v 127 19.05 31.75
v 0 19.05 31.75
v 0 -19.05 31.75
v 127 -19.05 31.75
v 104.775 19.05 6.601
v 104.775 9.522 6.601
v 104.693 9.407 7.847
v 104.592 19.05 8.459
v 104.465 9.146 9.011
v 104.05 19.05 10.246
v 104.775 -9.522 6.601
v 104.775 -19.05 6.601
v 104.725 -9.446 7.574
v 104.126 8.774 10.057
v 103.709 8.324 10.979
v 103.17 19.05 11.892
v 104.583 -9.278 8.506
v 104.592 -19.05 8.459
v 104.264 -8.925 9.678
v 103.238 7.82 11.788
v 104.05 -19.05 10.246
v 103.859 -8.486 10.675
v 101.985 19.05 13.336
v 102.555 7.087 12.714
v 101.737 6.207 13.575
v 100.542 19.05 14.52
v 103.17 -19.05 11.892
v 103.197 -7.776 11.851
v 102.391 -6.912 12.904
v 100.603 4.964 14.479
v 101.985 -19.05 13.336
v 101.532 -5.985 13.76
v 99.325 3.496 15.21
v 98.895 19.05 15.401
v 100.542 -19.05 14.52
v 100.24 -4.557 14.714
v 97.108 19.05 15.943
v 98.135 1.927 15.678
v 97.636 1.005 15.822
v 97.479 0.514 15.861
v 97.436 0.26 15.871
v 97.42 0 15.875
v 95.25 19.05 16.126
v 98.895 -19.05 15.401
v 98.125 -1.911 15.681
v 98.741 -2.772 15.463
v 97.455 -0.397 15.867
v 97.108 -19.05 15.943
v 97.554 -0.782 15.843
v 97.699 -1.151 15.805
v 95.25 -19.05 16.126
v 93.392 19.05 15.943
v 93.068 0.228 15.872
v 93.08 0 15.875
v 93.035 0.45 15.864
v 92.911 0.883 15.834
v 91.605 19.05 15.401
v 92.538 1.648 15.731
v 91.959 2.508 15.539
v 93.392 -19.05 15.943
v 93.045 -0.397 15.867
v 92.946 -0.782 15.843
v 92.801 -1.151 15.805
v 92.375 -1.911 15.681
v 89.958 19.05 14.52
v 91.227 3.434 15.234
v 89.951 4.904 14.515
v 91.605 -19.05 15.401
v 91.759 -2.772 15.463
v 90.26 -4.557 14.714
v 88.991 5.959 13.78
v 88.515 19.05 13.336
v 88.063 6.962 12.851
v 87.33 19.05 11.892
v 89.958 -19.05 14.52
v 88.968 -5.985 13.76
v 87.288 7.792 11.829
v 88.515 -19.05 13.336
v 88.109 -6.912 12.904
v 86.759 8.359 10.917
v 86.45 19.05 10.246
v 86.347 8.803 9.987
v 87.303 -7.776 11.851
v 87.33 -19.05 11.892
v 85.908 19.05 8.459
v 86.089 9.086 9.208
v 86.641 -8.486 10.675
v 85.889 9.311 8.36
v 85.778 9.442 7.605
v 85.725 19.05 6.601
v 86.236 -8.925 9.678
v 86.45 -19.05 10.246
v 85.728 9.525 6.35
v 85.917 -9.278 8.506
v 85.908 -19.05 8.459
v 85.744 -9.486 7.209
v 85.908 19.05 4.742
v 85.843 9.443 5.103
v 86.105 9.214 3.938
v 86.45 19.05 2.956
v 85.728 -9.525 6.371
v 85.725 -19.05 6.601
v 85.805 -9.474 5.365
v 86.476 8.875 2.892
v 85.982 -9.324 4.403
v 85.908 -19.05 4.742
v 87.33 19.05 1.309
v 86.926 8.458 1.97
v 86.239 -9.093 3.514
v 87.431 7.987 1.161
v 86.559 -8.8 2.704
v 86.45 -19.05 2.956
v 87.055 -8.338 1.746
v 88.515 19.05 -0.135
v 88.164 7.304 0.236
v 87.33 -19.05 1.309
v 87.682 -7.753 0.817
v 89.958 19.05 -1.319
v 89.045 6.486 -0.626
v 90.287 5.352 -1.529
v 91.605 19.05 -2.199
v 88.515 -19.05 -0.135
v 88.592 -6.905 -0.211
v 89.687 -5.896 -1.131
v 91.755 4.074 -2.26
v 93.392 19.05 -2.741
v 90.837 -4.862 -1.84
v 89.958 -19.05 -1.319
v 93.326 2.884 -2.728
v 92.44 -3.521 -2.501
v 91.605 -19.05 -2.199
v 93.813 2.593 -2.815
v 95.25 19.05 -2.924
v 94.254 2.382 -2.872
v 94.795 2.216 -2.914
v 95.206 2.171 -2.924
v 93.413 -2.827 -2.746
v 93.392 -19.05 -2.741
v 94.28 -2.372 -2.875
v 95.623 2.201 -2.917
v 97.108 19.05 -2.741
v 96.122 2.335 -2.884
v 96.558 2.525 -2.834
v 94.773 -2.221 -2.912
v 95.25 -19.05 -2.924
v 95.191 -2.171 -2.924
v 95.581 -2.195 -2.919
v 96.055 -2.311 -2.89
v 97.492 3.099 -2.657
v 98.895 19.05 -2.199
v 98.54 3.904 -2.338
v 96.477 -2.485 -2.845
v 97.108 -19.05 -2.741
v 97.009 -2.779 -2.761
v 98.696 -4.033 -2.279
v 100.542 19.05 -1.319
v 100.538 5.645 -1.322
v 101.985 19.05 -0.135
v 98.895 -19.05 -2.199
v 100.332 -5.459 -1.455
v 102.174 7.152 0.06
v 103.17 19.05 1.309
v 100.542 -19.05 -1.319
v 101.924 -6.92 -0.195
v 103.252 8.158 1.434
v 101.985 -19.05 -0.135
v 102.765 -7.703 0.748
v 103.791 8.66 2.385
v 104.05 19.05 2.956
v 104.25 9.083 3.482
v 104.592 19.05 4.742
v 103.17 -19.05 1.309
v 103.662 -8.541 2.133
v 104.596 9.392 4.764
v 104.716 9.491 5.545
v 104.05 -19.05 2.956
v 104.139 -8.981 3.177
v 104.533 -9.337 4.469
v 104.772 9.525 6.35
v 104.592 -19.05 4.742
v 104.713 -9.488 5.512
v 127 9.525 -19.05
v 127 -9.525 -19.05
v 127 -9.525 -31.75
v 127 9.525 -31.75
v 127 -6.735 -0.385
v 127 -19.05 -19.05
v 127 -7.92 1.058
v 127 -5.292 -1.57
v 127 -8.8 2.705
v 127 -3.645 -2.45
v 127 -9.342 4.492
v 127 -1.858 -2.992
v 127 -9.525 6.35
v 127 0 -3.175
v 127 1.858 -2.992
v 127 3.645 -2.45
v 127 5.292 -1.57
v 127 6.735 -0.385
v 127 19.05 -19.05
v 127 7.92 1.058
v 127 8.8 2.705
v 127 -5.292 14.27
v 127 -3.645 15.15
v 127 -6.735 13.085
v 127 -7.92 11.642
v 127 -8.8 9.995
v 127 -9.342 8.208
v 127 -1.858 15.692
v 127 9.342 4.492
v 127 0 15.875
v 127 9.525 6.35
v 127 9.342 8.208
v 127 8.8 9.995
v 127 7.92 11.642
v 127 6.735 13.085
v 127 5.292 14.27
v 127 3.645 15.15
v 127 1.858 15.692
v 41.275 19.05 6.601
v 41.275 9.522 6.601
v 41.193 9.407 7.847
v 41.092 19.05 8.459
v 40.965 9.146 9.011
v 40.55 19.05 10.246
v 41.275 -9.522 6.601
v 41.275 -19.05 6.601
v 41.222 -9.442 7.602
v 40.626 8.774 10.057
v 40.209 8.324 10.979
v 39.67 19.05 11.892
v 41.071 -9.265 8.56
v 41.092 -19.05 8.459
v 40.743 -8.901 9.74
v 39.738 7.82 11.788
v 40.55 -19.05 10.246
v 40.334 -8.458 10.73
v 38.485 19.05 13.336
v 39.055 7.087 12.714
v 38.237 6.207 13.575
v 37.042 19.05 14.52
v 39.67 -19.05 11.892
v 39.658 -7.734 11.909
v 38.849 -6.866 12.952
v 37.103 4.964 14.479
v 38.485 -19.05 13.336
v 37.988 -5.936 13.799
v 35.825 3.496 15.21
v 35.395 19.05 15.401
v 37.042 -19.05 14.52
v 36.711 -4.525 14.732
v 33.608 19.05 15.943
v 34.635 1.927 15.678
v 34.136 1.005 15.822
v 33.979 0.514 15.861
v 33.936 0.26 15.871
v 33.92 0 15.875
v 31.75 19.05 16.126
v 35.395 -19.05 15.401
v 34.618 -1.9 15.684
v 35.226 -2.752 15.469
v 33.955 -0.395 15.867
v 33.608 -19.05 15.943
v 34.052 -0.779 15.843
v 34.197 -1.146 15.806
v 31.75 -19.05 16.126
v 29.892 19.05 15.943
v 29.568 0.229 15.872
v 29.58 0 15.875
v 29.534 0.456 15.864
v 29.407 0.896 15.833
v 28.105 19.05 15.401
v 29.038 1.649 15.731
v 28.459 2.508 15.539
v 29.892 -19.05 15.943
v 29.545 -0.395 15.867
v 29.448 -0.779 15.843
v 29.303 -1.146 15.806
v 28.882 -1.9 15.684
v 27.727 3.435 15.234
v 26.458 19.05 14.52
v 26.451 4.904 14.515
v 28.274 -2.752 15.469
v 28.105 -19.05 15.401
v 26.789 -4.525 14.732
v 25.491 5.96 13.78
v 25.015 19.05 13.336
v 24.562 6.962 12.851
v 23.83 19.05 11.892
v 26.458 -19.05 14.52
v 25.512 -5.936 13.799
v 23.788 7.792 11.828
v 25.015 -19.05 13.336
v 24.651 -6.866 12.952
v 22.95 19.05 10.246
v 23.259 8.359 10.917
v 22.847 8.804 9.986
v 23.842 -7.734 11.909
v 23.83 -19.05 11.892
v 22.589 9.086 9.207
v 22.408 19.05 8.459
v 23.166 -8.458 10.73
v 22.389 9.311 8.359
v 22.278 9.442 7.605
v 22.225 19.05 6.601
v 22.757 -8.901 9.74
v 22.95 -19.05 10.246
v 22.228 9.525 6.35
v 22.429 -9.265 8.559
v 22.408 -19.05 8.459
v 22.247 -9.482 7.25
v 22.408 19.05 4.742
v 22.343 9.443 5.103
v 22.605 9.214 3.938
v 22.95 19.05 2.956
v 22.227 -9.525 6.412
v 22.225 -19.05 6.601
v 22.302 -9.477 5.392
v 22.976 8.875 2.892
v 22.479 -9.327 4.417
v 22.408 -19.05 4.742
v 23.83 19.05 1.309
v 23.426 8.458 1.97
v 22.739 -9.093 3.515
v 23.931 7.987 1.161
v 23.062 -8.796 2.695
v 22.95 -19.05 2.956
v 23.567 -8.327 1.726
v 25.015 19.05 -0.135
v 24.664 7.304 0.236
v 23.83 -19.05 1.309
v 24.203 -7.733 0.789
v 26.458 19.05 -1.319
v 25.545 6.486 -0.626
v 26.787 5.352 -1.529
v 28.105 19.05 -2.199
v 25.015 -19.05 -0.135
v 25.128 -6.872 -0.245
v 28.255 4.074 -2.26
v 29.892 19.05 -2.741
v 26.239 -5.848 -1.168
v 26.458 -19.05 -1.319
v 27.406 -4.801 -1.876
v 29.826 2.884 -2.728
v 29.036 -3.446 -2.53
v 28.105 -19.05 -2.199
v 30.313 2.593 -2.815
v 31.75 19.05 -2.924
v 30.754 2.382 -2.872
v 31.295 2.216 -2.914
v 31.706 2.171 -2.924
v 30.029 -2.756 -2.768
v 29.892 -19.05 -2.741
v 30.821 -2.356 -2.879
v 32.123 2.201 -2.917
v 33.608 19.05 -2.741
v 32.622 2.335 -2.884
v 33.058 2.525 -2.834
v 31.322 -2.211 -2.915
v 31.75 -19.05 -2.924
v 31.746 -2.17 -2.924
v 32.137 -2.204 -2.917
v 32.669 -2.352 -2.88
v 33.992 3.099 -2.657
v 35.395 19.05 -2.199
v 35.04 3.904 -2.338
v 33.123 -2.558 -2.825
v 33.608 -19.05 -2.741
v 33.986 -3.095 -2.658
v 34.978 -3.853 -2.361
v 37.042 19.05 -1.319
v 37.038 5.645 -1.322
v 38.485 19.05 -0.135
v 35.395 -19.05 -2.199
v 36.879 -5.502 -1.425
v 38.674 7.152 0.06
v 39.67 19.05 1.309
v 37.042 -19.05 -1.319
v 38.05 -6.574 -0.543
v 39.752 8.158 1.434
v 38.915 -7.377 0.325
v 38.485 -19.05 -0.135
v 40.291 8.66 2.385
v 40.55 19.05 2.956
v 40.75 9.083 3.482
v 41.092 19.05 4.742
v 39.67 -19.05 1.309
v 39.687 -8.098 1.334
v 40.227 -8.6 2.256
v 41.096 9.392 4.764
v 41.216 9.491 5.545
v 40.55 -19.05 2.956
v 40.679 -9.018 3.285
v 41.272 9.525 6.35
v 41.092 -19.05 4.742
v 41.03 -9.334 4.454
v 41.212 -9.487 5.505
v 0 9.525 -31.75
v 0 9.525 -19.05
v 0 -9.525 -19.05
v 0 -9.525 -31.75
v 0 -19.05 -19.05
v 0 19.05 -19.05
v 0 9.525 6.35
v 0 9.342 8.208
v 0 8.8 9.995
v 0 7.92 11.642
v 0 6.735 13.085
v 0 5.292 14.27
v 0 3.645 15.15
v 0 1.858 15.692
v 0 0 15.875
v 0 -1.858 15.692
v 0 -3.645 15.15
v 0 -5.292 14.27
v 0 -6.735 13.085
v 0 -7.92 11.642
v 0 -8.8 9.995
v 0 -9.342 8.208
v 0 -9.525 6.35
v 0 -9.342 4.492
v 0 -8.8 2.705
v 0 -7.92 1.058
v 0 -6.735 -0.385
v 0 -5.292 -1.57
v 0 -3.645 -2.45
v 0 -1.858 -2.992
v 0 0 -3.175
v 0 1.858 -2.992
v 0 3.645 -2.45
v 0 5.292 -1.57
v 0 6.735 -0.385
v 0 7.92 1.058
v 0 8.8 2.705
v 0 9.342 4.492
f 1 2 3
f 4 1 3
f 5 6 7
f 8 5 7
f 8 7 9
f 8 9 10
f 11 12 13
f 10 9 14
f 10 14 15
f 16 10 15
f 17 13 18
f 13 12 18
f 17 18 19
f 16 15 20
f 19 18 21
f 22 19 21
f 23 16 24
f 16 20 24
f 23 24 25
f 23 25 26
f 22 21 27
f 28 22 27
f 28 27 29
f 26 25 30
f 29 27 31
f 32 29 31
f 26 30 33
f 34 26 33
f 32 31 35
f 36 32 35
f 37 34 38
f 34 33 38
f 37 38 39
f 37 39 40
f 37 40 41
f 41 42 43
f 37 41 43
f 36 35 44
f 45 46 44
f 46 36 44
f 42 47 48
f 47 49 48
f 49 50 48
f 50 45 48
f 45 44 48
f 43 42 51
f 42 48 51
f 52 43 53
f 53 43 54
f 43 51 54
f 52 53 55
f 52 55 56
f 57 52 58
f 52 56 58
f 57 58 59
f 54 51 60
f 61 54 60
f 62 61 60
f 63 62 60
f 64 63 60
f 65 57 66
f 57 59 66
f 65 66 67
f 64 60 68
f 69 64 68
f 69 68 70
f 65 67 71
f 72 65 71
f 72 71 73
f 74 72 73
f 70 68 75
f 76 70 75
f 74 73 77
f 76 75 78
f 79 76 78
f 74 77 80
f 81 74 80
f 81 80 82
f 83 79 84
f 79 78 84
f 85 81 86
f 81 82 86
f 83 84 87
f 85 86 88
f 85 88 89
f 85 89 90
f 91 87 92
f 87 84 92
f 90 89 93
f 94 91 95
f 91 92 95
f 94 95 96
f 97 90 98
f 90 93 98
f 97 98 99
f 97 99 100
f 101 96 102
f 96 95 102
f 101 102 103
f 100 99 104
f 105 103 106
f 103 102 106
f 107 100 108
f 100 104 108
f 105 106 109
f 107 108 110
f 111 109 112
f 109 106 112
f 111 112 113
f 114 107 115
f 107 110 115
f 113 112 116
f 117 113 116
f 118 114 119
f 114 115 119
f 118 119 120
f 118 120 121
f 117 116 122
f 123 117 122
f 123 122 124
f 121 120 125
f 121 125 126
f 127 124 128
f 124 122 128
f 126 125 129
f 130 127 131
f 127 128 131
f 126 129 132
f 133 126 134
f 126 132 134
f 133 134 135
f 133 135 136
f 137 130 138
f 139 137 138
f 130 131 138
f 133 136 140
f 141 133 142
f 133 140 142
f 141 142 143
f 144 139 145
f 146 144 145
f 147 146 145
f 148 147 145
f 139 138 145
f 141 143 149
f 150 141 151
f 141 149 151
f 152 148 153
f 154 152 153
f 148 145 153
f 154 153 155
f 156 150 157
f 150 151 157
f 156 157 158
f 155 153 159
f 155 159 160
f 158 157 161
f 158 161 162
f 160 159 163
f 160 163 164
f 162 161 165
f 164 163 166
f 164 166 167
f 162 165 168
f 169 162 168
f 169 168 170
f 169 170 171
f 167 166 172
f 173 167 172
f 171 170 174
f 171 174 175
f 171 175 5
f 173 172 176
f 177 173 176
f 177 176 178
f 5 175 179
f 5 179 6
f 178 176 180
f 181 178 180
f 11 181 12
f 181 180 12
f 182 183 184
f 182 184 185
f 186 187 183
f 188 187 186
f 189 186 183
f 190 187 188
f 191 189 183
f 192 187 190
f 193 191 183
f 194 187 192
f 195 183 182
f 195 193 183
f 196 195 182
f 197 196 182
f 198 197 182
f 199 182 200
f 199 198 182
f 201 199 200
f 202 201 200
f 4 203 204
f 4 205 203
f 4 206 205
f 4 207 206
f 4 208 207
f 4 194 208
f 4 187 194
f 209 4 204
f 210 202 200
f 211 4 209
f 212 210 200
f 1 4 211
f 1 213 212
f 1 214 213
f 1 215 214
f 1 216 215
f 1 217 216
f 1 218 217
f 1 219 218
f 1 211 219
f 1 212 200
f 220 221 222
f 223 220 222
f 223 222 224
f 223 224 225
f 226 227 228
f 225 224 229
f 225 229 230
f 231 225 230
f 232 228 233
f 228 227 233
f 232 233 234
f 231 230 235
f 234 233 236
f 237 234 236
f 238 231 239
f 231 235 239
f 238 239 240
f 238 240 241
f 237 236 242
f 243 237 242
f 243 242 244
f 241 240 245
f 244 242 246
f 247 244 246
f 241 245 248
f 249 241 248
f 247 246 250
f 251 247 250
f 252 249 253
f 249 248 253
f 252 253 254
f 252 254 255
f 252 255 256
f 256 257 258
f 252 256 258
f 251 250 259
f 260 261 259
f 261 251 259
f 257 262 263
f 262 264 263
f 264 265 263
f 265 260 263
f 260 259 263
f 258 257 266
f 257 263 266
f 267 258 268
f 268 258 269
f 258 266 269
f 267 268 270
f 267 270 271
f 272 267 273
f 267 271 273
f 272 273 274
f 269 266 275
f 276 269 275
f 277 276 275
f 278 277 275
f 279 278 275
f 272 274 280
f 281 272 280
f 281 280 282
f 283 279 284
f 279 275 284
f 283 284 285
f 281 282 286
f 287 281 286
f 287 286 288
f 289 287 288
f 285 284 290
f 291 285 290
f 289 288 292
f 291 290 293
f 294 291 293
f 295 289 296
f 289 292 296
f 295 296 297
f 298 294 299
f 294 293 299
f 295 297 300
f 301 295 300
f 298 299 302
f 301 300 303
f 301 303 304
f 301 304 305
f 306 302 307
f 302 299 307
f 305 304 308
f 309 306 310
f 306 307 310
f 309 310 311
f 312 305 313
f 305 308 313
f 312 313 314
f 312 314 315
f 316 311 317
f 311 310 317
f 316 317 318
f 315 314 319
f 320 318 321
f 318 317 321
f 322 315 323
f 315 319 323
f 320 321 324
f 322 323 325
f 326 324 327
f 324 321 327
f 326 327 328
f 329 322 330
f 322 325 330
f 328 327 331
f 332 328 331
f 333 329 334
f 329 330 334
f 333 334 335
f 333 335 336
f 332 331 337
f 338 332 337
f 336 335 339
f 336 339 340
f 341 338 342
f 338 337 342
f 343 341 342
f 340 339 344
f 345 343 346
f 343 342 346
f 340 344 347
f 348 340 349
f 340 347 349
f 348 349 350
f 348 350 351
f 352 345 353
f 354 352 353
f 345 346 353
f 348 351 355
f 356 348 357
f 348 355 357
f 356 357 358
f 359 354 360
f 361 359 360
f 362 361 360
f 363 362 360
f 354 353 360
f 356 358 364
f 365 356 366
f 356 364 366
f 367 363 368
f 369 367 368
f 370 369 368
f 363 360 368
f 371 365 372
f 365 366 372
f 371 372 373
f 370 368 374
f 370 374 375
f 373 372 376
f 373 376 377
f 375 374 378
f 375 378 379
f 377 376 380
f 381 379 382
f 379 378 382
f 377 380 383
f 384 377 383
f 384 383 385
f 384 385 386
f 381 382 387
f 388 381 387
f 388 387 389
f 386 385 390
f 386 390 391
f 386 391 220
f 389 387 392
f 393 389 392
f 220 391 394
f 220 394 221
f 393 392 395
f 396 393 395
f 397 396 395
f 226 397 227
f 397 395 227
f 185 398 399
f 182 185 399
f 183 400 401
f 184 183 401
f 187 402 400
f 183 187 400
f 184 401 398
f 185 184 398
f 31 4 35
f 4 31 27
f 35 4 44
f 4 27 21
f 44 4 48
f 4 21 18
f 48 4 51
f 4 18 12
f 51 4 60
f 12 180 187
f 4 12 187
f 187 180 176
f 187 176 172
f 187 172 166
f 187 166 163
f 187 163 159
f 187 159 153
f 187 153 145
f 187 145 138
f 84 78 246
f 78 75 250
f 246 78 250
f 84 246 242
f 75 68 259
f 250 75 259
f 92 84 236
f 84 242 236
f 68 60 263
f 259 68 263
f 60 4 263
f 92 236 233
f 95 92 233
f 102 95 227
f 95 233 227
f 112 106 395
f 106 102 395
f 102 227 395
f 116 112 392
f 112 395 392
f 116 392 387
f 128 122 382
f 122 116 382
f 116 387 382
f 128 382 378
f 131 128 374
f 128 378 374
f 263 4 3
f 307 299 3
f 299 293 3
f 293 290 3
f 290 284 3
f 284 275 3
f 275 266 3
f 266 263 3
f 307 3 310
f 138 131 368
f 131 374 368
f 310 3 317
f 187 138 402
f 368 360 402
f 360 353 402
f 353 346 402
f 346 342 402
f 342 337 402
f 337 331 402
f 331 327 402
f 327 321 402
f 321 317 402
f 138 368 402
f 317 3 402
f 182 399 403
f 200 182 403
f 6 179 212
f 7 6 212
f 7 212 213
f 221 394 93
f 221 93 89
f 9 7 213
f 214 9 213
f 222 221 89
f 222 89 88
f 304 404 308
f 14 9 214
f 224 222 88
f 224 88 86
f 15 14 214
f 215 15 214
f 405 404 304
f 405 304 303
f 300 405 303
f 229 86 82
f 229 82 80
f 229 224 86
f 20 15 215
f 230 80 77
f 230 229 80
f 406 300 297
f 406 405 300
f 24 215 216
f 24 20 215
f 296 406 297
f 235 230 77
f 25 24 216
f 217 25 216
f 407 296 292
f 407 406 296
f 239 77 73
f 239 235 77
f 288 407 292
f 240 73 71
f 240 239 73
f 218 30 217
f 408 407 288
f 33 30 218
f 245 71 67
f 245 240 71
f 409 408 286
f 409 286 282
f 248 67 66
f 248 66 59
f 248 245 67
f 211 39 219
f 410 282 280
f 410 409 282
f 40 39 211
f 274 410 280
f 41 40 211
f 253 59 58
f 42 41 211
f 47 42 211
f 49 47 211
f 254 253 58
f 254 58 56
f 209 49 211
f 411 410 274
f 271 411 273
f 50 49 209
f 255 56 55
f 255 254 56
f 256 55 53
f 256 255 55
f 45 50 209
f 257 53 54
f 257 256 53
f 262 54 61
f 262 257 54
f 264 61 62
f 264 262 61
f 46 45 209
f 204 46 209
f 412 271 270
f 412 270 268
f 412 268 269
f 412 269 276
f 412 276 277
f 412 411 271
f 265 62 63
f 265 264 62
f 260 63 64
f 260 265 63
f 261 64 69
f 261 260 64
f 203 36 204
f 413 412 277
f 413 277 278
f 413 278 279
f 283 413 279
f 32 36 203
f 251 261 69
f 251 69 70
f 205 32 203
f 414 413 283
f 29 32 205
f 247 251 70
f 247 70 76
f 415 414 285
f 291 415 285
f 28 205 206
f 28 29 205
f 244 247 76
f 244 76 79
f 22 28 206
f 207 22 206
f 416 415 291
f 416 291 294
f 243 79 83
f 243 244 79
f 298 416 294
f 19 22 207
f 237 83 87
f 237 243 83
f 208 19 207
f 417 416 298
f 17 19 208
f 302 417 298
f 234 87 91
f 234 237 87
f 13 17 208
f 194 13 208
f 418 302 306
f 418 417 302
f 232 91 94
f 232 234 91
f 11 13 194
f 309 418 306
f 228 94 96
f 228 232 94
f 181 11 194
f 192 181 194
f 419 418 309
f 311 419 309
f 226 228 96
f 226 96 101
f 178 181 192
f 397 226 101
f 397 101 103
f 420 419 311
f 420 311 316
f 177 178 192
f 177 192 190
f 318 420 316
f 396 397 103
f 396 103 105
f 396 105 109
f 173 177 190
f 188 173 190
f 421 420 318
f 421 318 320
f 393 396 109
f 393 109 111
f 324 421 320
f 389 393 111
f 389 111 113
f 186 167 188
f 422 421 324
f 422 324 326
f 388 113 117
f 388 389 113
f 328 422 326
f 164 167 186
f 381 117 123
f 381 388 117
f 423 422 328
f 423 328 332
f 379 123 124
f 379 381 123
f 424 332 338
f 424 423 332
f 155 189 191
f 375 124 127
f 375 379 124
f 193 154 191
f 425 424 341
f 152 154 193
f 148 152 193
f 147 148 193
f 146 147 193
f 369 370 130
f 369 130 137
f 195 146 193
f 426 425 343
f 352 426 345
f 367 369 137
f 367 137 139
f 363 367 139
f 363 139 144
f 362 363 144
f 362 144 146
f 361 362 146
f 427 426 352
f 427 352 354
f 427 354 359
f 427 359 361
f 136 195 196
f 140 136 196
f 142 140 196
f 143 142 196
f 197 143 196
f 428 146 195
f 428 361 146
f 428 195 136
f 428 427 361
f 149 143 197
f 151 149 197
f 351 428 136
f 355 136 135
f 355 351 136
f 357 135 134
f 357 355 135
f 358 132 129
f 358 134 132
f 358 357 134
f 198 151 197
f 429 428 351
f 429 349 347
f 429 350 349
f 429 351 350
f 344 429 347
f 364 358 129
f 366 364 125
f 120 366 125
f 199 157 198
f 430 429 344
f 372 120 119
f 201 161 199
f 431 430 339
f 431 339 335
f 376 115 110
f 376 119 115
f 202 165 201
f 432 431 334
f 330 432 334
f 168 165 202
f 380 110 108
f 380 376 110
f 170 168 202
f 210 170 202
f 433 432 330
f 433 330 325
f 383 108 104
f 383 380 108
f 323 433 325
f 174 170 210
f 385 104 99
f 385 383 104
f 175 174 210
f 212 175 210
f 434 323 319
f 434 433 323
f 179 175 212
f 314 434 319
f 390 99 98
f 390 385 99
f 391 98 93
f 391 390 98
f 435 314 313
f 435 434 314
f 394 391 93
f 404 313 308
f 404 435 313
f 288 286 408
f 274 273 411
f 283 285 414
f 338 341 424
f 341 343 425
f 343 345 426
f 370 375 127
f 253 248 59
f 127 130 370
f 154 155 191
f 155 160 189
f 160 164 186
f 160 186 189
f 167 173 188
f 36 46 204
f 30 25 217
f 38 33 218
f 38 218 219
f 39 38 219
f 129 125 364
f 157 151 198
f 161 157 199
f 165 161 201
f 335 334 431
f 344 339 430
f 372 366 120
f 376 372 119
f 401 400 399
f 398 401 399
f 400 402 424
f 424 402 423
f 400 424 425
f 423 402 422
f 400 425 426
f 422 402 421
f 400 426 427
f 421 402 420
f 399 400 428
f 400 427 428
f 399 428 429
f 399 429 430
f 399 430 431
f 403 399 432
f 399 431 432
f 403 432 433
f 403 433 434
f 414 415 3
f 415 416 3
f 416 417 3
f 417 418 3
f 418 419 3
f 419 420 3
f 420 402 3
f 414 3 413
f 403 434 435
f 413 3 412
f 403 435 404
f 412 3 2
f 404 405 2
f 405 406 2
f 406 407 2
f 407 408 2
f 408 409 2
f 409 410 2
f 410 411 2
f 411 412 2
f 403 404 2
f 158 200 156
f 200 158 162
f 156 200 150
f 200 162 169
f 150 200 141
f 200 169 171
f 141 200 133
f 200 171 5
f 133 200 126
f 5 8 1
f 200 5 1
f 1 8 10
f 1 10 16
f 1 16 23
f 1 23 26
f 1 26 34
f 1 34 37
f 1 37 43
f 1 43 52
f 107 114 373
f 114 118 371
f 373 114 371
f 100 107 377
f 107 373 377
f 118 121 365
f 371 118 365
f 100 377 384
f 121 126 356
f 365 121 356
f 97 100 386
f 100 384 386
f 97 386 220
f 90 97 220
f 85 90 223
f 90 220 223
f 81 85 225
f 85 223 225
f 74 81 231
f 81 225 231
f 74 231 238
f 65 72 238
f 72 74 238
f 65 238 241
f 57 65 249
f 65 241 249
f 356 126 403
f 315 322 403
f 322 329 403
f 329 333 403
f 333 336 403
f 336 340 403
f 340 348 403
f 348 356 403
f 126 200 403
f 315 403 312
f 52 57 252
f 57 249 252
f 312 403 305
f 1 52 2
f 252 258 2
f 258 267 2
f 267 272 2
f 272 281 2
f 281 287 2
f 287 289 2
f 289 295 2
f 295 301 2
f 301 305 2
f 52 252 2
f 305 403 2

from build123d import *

# Parameters (mm, degrees)
F0_R          = 9.525
F1_DEPTH      = 127
F2_R          = 9.525
F3_DEPTH      = 46.228
F3_DEPTH_BACK = 48.514


with BuildPart() as f1:
    # F0 (on Right) → F1 (new body)
    with BuildSketch(Plane.YZ):
        Polygon((19.05, -19.05), (19.05, 31.75), (-19.05, 31.75), (-19.05, -19.05), (-9.525, -19.05), (-9.525, -31.75), (9.525, -31.75), (9.525, -19.05), align=None)
        with Locations((0, 6.35)):
            Circle(F0_R, mode=Mode.SUBTRACT)
    extrude(amount=F1_DEPTH)

    # F2 (on Front) → F3 (cut, two sides)
    with BuildSketch(Plane.XZ) as f3_sk:
        with Locations((31.75, 6.600567)):
            Circle(F2_R)
        with Locations((95.25, 6.600567)):
            Circle(F2_R)
    extrude(amount=F3_DEPTH, mode=Mode.SUBTRACT)
    extrude(f3_sk.sketch, amount=-F3_DEPTH_BACK, mode=Mode.SUBTRACT)


solid = f1.part
